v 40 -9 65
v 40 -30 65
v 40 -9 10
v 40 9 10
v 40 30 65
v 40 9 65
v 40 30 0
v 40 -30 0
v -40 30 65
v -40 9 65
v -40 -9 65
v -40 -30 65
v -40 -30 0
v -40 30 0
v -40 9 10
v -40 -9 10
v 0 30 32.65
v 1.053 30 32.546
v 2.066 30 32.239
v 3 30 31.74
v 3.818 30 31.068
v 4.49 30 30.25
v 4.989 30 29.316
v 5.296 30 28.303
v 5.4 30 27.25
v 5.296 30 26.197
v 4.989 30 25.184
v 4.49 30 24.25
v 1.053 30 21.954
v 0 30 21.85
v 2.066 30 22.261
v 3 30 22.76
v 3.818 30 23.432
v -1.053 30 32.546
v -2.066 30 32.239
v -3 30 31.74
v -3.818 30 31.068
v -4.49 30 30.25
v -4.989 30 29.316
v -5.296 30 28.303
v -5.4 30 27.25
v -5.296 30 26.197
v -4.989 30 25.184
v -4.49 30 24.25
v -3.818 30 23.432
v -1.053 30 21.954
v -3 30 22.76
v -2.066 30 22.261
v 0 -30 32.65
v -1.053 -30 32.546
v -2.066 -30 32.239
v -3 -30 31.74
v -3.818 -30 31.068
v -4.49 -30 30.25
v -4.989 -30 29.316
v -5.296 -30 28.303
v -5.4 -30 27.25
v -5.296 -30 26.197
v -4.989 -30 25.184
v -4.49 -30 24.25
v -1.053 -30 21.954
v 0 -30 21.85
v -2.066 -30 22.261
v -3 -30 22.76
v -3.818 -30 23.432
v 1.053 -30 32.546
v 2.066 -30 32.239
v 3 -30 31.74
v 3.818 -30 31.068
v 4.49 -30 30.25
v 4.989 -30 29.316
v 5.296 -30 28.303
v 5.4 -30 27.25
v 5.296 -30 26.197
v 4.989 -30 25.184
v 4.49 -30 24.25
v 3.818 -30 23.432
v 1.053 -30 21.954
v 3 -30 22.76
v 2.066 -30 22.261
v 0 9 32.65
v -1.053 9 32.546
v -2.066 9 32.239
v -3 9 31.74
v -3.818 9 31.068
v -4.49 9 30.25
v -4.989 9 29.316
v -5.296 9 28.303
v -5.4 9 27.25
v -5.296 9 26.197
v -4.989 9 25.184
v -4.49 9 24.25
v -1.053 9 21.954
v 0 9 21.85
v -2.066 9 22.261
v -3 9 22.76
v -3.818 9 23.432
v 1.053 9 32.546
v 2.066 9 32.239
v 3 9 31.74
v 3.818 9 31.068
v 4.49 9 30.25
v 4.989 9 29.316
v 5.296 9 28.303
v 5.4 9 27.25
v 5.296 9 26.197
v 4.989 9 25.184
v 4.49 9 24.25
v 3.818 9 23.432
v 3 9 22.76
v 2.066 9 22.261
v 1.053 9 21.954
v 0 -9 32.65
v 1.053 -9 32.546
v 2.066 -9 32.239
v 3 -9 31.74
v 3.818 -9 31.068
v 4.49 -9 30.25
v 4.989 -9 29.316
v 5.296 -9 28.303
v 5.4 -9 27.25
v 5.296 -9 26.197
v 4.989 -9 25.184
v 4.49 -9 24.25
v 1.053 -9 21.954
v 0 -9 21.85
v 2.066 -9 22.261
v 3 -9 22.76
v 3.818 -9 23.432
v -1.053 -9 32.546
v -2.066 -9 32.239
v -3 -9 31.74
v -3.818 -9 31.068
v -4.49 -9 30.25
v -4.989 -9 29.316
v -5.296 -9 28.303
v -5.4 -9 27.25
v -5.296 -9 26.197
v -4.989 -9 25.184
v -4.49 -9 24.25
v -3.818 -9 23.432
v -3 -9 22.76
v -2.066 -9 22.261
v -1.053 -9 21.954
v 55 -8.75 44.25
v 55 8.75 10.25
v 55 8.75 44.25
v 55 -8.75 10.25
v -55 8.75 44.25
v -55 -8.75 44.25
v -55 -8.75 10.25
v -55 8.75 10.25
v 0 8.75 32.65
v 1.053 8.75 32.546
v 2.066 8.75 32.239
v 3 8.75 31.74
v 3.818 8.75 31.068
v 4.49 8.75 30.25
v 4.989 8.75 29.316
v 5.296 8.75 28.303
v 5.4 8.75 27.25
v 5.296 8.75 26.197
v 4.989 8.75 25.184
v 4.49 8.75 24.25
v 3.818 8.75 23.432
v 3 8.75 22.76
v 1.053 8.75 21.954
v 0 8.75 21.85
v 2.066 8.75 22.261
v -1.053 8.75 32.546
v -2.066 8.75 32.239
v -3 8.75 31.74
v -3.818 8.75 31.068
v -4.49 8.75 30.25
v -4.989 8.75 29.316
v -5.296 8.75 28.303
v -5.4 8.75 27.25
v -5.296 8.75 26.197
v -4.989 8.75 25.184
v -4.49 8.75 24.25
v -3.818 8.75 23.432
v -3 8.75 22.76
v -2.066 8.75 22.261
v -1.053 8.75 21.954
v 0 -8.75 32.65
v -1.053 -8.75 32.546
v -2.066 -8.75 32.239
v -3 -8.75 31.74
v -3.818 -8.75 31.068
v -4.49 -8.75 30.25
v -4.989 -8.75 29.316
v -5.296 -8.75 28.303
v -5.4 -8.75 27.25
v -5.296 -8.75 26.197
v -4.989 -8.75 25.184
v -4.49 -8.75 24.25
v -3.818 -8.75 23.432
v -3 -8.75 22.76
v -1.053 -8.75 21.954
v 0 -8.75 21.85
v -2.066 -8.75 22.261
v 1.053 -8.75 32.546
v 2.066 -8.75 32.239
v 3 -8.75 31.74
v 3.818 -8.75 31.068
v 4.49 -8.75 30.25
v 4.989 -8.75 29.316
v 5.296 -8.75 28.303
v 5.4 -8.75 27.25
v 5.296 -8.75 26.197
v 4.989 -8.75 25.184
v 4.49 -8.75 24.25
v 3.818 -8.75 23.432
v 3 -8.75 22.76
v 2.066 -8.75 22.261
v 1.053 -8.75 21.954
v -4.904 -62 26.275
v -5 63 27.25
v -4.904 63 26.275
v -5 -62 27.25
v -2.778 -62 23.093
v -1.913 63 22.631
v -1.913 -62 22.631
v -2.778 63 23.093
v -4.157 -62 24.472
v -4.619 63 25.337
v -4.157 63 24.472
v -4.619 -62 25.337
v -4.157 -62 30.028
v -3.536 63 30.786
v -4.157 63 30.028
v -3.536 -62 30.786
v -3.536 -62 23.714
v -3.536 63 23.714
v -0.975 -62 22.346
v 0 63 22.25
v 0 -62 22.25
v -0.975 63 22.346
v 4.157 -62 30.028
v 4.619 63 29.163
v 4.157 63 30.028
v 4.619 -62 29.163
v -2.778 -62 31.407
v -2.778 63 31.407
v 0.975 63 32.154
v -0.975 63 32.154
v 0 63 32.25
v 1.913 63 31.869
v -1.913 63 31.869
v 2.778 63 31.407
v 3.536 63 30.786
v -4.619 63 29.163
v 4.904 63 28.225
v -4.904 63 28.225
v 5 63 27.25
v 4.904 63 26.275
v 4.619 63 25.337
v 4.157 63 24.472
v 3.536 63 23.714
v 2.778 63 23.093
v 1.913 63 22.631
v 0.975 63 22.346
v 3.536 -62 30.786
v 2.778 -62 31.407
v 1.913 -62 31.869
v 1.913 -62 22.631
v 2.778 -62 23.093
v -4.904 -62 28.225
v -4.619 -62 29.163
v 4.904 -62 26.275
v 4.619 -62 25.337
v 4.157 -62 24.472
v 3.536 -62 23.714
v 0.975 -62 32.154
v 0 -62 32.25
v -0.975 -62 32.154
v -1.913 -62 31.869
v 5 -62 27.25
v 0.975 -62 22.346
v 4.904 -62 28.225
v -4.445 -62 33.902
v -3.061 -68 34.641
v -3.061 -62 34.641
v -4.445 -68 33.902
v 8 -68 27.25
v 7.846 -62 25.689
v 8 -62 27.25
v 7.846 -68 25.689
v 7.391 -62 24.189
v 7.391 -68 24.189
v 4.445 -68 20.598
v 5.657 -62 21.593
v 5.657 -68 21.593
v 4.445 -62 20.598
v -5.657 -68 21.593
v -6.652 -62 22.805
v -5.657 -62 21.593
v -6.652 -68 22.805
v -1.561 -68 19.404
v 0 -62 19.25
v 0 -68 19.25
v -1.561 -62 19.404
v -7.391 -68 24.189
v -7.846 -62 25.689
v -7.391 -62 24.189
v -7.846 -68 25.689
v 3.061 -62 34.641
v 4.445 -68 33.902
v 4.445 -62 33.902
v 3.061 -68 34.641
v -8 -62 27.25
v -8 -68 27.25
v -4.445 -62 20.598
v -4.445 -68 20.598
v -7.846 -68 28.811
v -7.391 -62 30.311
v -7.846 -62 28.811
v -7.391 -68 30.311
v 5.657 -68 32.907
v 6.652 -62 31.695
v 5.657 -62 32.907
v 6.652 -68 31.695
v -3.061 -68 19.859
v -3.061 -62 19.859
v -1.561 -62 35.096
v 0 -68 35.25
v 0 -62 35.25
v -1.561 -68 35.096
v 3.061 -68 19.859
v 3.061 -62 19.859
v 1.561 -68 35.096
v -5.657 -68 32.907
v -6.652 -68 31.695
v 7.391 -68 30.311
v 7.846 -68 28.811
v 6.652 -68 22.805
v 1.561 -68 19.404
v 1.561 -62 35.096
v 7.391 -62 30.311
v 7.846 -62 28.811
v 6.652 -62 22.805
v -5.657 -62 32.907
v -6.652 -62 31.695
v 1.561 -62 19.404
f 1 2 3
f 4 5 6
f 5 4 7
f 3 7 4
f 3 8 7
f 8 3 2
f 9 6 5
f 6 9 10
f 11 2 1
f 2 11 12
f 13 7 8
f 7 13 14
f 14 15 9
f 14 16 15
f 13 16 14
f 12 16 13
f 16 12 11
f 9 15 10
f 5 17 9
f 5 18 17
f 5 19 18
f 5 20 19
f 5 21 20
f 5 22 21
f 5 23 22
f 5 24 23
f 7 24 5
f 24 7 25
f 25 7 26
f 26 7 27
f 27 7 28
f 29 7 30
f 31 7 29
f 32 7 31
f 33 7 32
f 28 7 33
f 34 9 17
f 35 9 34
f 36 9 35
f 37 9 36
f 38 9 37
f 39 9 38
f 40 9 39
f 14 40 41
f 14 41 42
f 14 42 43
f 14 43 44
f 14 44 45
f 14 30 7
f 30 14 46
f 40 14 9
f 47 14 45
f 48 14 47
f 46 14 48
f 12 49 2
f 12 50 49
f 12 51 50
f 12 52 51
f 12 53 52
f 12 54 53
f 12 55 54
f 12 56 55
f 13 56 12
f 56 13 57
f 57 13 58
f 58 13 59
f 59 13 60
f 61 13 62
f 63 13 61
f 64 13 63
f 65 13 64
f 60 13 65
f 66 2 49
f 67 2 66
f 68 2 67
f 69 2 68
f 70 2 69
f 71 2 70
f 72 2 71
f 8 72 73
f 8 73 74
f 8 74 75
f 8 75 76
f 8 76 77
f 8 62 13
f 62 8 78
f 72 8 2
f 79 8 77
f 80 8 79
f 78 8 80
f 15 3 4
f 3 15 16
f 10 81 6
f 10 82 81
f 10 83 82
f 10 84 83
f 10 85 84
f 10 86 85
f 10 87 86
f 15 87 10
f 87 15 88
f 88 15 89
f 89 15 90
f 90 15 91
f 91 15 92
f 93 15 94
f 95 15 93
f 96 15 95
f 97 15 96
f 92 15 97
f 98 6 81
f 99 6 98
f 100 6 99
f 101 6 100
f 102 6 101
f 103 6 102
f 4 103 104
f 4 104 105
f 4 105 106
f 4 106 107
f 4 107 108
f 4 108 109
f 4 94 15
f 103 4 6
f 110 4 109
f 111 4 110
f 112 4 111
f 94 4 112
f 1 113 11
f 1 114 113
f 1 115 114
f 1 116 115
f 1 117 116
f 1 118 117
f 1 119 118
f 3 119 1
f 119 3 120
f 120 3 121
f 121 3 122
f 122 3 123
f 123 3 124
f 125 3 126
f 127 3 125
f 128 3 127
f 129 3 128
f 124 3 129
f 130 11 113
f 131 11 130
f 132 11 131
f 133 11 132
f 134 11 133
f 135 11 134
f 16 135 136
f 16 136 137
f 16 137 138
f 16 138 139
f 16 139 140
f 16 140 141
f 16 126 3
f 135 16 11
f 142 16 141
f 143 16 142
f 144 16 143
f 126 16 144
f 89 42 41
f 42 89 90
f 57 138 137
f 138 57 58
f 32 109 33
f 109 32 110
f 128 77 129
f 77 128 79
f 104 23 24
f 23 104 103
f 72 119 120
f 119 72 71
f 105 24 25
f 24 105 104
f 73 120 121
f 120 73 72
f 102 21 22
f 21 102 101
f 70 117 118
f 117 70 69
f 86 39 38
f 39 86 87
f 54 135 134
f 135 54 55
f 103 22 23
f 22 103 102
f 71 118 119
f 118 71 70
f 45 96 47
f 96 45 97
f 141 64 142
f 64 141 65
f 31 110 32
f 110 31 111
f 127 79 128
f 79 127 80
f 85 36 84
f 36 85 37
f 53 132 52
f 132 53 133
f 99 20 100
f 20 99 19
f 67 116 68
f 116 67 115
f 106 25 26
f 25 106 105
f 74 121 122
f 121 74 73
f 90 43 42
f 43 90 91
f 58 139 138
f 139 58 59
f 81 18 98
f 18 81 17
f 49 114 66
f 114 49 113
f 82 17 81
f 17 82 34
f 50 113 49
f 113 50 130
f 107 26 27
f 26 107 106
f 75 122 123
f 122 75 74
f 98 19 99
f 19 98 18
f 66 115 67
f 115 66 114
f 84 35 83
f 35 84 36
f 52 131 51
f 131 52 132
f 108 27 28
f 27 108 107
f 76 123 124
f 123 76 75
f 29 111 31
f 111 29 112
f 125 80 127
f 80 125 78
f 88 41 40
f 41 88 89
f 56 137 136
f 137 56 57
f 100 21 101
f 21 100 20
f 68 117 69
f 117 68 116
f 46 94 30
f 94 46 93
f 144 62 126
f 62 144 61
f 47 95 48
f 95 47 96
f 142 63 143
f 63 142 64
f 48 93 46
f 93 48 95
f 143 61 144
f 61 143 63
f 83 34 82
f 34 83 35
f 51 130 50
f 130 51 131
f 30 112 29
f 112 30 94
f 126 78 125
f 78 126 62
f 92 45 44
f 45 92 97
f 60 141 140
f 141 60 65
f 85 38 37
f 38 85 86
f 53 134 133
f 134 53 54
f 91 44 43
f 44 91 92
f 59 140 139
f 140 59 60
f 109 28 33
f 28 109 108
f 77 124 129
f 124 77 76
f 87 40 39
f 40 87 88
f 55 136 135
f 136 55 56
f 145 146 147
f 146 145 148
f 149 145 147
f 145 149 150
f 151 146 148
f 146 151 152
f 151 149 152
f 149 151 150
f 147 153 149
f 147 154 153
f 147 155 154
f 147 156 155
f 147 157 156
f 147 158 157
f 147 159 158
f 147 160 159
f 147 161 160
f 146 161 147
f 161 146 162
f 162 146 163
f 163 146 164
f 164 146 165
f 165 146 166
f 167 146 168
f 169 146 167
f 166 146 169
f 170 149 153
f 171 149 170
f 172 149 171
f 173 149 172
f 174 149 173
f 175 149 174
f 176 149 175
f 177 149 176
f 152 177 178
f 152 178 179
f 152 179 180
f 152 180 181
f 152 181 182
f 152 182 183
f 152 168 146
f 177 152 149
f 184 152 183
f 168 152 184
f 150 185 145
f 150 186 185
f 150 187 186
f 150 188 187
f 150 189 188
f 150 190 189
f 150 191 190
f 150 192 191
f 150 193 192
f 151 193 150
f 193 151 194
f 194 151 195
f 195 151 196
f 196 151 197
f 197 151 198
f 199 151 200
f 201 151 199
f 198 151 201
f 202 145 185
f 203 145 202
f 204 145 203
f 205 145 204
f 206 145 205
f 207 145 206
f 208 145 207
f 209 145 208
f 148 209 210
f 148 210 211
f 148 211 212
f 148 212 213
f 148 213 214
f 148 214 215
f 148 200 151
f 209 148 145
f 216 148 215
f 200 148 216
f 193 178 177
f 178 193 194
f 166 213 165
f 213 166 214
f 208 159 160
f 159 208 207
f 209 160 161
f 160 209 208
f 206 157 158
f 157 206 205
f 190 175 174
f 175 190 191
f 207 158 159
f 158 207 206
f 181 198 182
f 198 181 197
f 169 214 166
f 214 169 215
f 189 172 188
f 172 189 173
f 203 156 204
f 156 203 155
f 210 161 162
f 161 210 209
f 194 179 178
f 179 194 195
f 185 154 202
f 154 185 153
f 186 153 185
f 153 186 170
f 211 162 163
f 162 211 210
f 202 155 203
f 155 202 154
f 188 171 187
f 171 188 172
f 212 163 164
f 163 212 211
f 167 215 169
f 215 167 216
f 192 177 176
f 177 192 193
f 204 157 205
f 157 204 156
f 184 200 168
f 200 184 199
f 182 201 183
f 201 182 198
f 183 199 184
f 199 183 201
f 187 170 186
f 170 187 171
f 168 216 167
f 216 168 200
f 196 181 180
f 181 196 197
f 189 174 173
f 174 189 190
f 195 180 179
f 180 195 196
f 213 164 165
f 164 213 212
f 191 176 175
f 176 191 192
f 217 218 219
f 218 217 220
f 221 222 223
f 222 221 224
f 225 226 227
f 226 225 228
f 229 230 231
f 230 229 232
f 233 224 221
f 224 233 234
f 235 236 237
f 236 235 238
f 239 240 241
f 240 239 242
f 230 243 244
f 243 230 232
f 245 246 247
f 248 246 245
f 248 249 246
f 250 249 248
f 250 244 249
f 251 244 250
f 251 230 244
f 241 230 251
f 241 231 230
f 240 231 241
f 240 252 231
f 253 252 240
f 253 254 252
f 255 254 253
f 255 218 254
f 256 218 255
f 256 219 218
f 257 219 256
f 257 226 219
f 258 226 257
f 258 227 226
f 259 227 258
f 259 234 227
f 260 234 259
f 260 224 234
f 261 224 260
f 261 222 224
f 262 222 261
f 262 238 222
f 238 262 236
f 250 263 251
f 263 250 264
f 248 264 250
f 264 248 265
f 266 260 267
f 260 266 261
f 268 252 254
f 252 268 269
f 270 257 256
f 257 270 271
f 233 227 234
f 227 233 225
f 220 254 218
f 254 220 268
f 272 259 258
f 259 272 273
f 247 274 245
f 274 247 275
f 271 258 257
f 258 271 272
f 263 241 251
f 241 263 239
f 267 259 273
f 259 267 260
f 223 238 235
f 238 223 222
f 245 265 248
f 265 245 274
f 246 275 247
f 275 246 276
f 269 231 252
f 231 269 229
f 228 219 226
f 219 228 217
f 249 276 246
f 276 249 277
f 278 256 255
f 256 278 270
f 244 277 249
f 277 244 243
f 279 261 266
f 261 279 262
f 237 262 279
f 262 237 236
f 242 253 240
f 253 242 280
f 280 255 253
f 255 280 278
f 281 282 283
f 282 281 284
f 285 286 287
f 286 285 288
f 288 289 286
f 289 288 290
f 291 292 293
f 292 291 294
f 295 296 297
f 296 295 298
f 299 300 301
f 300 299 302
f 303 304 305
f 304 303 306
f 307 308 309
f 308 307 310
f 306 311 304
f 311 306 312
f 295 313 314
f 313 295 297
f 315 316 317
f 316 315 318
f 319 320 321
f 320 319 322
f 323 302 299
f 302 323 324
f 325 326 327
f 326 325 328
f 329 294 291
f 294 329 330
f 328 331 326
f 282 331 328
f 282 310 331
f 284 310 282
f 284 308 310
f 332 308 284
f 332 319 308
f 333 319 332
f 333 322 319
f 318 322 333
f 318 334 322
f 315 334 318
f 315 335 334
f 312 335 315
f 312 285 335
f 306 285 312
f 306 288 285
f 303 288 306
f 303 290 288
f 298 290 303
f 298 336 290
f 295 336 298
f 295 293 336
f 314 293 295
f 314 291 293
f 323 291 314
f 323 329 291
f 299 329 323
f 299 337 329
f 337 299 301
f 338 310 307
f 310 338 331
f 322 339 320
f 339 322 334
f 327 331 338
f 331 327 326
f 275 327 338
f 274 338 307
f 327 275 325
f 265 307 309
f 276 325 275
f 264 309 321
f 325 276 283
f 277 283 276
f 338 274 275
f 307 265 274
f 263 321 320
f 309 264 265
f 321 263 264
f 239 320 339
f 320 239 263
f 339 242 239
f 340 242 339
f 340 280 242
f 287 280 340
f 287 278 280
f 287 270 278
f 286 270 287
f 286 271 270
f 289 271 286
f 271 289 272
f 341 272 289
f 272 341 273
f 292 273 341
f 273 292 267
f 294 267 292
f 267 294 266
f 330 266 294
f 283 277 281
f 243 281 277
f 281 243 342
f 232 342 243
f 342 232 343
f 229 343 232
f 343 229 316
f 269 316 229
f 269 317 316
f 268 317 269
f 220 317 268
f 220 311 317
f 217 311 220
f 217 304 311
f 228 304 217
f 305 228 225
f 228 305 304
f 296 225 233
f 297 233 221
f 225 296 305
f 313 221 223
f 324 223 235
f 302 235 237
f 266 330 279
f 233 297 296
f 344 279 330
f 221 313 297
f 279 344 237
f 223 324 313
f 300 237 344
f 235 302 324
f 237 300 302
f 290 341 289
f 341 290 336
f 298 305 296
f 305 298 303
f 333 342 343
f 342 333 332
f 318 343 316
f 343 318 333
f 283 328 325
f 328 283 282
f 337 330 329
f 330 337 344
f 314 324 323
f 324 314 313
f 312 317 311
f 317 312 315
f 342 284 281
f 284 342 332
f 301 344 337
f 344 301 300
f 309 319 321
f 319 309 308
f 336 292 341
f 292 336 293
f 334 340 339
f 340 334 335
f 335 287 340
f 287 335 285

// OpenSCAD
$fn = 32;

// ------------------------------------------------------------------------
// Clevis joint: 80 mm clevis, pin d10
// Every part is its own module, assembly() places them once.
// ------------------------------------------------------------------------

// --- part 1 ---
module clevis() {
  difference() {
    translate([-40, -30, 0]) cube([80, 60, 65]);
    translate([-41, -9, 10]) cube([82, 18, 56]);
    translate([0, 0, 27.25]) rotate([90, 0, 0]) cylinder(h = 62, d = 10.8, center = true);
  }
}

// --- part 2 ---
module eye() {
  difference() {
    translate([-55, -8.75, 0]) cube([110, 17.5, 34]);
    translate([0, 0, 17]) rotate([90, 0, 0]) cylinder(h = 19.5, d = 10.8, center = true);
  }
}

// --- part 3 ---
module pin() {
  rotate([0, 90, 0]) cylinder(h = 126, d = 10, center = true);
  translate([-68, 0, 0]) rotate([0, 90, 0]) cylinder(h = 6, d = 16);
}

// --- assembly ---
module assembly() {
  translate([0, 0, 0]) rotate([0, 0, 0]) clevis();
  translate([0, 0, 10.25]) rotate([0, 0, 0]) eye();
  translate([0, 0, 27.25]) rotate([0, 0, 90]) pin();
}

assembly();
